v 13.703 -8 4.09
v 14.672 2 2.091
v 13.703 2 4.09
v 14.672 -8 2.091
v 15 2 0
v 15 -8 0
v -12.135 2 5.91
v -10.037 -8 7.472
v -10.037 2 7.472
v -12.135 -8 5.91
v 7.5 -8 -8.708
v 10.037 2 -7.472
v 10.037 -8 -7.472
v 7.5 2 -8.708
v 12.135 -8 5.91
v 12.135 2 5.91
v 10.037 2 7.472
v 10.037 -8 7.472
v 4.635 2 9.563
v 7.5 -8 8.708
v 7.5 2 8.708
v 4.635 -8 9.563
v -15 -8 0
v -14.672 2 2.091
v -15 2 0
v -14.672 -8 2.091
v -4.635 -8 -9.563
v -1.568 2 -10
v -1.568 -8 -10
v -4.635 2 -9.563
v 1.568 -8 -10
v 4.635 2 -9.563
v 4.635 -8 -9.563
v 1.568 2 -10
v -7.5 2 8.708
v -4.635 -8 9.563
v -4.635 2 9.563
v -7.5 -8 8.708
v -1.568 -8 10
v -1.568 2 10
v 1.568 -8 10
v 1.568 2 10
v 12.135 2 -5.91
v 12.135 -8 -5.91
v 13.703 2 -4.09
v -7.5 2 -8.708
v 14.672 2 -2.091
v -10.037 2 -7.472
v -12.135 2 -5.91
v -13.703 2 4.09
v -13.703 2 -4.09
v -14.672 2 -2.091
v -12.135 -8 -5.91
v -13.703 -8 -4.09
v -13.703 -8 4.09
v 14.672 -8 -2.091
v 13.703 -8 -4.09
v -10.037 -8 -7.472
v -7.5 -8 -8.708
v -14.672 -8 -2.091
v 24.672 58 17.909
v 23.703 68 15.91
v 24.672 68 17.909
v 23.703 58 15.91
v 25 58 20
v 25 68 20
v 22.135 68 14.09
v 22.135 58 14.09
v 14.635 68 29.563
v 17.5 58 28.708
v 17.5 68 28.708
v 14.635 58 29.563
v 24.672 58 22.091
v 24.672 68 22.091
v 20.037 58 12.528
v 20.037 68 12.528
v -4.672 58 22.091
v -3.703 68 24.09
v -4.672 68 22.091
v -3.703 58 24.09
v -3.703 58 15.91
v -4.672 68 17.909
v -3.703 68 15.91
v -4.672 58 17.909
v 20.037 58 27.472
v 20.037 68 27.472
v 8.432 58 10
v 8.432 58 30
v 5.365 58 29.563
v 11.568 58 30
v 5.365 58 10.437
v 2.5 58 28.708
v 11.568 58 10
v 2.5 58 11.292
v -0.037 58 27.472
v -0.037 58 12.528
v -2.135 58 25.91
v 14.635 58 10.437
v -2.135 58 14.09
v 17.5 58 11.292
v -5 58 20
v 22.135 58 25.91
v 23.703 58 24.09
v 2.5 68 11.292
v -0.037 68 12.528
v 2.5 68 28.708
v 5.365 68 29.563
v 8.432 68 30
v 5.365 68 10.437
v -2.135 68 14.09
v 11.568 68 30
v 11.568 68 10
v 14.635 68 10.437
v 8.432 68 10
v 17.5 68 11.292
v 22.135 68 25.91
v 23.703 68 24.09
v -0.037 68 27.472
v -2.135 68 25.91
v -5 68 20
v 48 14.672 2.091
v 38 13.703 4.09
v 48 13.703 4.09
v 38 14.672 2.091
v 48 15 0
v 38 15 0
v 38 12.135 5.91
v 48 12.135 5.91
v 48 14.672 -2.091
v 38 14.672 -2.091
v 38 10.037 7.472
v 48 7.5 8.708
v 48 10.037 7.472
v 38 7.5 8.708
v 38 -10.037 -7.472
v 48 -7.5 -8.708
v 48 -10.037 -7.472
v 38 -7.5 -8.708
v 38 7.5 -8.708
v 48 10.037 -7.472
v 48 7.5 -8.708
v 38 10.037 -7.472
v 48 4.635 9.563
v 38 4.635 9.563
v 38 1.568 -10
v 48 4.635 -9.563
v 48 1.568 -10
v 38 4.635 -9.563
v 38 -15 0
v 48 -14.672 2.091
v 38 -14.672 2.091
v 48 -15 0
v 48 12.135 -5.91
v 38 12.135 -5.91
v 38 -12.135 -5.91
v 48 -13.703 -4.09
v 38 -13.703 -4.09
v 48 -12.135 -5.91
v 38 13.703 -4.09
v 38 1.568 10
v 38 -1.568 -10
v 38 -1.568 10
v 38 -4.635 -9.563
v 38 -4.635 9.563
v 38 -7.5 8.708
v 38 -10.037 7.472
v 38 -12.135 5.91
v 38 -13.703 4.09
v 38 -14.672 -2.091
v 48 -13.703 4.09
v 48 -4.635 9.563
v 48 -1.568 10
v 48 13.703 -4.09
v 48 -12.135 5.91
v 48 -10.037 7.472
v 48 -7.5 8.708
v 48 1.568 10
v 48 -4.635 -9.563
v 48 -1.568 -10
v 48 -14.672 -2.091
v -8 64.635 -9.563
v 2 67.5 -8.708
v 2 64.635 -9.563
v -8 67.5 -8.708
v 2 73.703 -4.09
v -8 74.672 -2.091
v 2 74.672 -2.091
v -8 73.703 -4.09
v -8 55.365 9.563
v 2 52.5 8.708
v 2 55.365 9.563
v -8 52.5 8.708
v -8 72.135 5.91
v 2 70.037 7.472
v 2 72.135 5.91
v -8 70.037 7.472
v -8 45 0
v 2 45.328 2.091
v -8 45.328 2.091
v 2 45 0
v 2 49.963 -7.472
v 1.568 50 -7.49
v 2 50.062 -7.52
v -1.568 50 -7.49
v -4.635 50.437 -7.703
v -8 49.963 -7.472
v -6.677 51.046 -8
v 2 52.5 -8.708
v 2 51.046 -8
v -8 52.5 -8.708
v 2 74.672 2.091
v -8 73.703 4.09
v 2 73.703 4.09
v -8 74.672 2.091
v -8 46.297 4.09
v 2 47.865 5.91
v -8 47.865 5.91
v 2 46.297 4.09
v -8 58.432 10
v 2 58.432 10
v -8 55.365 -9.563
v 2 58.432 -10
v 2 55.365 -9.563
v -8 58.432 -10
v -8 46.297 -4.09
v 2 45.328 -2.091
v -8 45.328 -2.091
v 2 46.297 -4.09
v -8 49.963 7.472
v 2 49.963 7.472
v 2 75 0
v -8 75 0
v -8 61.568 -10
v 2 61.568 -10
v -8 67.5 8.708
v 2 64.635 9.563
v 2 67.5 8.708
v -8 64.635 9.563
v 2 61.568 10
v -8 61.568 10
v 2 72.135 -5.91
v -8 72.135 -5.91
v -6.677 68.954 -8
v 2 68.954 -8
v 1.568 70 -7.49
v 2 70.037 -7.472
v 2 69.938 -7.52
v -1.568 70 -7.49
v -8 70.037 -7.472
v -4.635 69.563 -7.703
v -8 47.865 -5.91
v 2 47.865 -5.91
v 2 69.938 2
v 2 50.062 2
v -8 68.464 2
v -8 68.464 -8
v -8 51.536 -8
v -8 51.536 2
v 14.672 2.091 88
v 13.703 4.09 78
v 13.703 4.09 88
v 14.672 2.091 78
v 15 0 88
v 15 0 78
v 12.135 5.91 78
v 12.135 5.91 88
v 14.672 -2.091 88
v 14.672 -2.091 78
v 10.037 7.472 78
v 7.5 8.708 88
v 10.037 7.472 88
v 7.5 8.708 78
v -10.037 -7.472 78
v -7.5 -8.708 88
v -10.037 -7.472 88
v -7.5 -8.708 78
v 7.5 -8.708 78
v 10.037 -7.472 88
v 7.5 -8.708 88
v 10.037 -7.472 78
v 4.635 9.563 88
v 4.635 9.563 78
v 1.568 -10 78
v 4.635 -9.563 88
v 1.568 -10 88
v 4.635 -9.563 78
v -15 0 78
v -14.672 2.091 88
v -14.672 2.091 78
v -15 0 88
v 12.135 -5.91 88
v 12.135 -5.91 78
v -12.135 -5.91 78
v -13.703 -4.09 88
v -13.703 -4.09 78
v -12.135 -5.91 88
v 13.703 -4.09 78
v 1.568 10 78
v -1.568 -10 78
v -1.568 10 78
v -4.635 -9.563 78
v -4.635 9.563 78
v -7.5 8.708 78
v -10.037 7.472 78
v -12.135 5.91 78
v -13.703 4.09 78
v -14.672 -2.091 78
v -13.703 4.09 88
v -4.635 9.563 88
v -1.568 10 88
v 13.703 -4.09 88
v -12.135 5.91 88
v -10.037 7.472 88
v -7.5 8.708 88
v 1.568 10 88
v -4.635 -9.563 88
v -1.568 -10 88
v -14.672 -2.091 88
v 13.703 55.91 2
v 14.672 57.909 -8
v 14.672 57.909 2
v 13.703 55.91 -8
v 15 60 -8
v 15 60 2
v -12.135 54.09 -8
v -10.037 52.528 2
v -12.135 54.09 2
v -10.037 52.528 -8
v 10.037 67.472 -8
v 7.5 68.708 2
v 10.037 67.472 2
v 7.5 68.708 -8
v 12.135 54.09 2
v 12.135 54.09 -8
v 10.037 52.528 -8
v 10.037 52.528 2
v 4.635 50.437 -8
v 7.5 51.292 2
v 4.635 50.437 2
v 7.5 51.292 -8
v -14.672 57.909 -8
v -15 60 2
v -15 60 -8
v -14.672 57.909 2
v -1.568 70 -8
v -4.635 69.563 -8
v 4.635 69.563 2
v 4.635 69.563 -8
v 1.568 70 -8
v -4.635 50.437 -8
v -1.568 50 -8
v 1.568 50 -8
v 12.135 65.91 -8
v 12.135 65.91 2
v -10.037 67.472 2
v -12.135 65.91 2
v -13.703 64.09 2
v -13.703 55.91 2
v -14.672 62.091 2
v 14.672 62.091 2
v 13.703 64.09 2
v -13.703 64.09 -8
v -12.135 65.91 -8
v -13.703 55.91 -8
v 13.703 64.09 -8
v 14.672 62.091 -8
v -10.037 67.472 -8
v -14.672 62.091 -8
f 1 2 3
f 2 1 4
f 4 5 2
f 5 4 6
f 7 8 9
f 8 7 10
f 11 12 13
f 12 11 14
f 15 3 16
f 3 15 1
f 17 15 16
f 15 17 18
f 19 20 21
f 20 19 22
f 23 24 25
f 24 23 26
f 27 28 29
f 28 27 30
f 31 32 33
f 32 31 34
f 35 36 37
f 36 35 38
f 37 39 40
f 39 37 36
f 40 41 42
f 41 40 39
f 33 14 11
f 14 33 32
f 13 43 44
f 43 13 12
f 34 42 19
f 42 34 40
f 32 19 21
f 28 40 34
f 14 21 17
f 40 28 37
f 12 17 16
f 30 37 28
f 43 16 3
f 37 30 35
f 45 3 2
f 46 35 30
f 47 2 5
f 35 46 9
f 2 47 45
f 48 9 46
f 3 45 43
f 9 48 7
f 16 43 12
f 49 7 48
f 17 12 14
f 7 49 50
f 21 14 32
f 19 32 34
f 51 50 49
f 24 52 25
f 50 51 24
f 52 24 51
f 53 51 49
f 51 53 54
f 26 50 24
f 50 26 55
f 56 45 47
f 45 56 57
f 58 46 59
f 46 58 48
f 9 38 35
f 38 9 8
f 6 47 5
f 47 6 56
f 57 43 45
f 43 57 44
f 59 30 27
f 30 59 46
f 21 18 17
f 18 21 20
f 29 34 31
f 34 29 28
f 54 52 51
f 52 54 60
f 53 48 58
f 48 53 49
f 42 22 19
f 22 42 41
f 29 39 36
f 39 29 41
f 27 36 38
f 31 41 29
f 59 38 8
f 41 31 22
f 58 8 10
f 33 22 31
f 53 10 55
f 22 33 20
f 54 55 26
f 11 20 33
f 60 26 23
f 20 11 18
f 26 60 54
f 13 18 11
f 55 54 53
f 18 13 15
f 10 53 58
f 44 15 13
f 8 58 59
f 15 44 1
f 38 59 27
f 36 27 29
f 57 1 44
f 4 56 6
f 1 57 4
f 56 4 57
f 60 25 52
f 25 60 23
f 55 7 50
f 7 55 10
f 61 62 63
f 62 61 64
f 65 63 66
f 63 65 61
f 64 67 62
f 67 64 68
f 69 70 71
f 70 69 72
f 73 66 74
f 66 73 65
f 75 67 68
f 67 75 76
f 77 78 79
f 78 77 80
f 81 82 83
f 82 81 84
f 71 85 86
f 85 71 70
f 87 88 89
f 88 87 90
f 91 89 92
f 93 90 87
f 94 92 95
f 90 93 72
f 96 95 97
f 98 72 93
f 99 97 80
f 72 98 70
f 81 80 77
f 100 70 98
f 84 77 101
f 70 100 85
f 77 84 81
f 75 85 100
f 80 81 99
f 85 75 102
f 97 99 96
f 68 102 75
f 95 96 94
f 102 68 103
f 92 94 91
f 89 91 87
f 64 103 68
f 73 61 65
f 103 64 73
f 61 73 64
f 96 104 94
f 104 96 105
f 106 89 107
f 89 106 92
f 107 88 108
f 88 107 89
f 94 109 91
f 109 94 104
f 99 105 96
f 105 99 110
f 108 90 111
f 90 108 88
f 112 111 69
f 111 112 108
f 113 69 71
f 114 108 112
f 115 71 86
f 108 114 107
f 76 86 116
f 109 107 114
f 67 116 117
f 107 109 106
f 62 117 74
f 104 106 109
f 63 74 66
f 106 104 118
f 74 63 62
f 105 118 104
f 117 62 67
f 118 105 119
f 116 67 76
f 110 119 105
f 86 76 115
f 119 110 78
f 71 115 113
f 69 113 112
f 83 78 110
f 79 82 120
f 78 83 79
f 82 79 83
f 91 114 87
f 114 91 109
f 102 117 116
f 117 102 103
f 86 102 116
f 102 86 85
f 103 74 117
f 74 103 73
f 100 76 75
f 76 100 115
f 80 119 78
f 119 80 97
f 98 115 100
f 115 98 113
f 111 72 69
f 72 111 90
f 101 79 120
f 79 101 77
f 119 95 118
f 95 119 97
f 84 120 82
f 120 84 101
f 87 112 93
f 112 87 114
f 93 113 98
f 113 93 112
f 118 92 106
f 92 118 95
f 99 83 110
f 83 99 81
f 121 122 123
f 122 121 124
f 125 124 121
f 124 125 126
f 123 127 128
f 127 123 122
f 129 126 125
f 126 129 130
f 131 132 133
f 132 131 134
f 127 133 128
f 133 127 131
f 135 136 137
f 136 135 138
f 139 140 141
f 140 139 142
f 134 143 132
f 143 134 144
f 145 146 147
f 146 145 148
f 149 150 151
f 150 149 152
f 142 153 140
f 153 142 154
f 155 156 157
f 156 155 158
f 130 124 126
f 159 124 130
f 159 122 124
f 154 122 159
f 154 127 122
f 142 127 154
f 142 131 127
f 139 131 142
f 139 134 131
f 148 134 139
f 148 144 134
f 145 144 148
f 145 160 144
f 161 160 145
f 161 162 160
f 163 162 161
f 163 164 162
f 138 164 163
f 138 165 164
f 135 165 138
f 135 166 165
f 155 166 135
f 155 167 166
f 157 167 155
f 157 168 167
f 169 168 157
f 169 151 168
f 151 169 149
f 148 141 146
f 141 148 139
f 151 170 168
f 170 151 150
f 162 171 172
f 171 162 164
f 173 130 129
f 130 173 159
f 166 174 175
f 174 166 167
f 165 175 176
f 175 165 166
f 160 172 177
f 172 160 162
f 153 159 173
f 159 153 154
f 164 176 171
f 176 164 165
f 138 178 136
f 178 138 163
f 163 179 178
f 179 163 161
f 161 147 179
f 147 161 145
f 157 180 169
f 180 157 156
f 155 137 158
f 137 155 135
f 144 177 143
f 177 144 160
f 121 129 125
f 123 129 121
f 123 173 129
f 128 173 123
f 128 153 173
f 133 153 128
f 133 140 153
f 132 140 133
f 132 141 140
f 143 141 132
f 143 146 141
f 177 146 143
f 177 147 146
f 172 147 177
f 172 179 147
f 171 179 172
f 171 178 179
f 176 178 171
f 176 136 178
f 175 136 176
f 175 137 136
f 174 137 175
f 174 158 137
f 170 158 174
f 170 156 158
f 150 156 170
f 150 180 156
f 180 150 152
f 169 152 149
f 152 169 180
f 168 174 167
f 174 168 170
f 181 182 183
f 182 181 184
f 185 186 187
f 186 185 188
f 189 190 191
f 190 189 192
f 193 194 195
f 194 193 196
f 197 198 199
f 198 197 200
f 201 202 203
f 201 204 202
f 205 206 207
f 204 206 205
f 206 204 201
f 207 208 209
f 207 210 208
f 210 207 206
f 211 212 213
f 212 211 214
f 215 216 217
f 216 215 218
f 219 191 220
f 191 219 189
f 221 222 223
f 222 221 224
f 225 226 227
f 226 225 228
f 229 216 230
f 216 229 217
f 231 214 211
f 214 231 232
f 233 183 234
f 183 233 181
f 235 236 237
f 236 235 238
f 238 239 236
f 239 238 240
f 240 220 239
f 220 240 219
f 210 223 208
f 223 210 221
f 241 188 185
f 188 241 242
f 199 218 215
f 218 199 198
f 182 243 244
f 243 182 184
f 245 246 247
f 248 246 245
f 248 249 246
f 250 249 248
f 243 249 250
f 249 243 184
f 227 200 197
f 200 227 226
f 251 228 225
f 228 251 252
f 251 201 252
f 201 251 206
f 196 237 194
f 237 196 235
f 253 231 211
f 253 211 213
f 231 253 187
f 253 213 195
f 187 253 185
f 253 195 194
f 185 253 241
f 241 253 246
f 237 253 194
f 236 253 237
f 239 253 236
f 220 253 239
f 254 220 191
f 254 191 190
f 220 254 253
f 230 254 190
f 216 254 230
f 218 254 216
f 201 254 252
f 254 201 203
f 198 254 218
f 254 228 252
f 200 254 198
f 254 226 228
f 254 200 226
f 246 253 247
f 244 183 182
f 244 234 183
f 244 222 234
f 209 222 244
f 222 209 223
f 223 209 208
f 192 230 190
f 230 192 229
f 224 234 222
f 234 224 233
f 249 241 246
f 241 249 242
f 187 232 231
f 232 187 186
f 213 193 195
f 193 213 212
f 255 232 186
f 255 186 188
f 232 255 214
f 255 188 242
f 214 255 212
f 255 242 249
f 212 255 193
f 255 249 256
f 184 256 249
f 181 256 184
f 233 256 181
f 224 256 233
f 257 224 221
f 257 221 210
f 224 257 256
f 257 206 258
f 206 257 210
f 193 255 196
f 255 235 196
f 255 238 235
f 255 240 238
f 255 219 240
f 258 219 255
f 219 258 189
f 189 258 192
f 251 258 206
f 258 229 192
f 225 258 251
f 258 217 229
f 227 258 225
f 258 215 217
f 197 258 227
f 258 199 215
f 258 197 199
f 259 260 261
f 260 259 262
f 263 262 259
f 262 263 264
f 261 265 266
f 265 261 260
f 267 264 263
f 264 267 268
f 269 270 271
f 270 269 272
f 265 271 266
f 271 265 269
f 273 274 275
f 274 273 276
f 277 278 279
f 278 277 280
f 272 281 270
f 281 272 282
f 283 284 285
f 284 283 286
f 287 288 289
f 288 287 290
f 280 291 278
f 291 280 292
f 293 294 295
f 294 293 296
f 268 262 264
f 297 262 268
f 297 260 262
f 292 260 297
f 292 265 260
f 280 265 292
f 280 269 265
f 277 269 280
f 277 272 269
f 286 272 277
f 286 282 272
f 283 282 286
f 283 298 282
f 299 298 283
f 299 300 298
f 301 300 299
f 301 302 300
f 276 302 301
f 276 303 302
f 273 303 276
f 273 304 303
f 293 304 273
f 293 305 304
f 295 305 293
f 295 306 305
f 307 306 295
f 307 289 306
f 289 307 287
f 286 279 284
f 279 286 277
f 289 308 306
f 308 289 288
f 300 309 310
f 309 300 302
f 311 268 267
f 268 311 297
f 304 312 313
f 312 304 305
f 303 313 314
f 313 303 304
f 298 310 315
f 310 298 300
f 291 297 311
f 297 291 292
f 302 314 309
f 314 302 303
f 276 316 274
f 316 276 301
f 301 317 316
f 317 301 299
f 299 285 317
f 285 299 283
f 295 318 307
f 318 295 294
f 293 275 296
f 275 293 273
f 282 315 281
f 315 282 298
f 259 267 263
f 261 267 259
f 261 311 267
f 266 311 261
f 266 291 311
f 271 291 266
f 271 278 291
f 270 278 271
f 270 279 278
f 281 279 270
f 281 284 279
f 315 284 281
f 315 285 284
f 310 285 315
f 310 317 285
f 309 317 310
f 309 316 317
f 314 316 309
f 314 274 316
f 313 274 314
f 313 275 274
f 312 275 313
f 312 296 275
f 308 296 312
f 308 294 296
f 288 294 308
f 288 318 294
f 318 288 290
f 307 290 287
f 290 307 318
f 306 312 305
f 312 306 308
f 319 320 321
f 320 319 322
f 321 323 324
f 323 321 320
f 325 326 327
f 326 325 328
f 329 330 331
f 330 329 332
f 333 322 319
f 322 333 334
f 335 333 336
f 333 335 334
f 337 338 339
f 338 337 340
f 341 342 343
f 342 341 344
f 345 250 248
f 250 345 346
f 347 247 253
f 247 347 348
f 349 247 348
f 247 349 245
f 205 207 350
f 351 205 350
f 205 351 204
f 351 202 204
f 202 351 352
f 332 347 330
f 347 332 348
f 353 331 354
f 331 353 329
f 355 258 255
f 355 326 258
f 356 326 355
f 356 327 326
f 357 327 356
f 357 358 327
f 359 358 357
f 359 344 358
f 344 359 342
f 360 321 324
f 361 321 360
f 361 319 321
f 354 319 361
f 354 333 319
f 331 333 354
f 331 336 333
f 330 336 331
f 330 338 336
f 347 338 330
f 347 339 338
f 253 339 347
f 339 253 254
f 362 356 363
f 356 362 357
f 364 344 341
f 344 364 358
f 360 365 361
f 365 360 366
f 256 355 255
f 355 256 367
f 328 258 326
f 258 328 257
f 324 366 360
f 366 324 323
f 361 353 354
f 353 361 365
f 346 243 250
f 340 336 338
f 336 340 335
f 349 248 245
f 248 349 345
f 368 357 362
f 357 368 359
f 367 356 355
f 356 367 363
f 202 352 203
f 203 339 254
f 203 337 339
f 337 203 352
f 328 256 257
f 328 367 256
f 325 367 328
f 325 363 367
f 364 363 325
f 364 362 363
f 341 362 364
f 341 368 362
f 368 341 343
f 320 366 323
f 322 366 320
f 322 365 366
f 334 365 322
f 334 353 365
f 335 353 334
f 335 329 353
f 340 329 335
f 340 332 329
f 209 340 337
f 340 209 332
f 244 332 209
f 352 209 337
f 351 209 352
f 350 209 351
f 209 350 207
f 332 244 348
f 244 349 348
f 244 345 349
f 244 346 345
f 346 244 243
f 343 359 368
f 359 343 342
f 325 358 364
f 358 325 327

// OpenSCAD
// file: ../generic_case/screw_holes.scad
// Module for creating screw holes based on an array of [x,y,z] locations



module screw_holes(loc,dia,h){
    for(l=loc){
        translate(l){
            cylinder(d=dia,h=h);
        }
    }
}

module corner_latches(dim_b,loc_s,dia_s,space_s,height_s){
    //calculate corner points
    loc_c   = [[[0,0],[loc_s[0][0],0],[loc_s[0][0],loc_s[0][1]],[0,loc_s[0][1]]],
               [[loc_s[1][0],0],[dim_b[0],0],[dim_b[0],loc_s[1][1]],[loc_s[1][0],loc_s[1][1]]],
               [[loc_s[2][0],loc_s[2][1]],[dim_b[0],loc_s[2][1]],[dim_b[0],dim_b[1]],[loc_s[2][0],dim_b[1]]],
               [[0,loc_s[3][1]],[loc_s[3][0],loc_s[3][1]],[loc_s[3][0],dim_b[1]],[0,dim_b[1]]]]; // corners
    
    difference(){
        for(i=[0 : len(loc_c)-1]){
            hull(){
                linear_extrude(height_s)
                    polygon(points=loc_c[i]);
                translate(loc_s[i]){
                    cylinder(d=dia_s+space_s,h=height_s);
                }
            }
        }
    }
}
    
// file: ../generic_case/cube_round_xy.scad
// Module for painting cube with rounded corners in xy directions

module cube_round_xy(dim,mki){
    if(mki<=0){
        cube(dim);
    }
    else {
        translate([mki/2,mki/2,0]){
            linear_extrude(dim[2]){
                minkowski(){
                    square([dim[0]-mki,dim[1]-mki]);
                    circle(d=mki);
                }
            }
        }
    }
}
// file: ../generic_case/make_cuts-v2.scad
dim=[40,60,80];
loc=[10,20];
w=2;
x=30;
y=20;
z=10;
shape="round";

%cube(dim);

translate([x/2,0,y/2]){ // move to zero
    //front
    rotate([90,0,0])
        translate([0,0,+z/2-w]) // move into wall
            mkshape(shape);

    //back
    translate([dim[0]-x,0,0])
    rotate([270,0,0])
        translate([0,0,+z/2-w+dim[1]])
            mkshape(shape);
}


translate([0,x/2,y/2]){            
    //right
    rotate([90,0,90])
        translate([0,0,+z/2-w+dim[0]])
            mkshape(shape);
    
    //left
    translate([0,dim[1]-x,0])
    rotate([90,0,270])
        translate([0,0,+z/2-w])
            mkshape(shape);
}

translate([x/2,y/2,0]){            
    //top
    rotate([0,0,0])
        translate([0,0,+z/2-w+dim[2]])
            mkshape(shape);
    
    //bottom
    translate([0,dim[1]-y,0])
    rotate([180,0,0])
        translate([0,0,+z/2-w])
            mkshape(shape);
}

module mkshape(shape){
    if(shape=="square"){
        cube([x,y,z],center=true);
    }
    if(shape=="round"){
        translate([-x/2,-y/2,0])
        resize([0,y,0])
            cylinder(d=x,h=z,center=true);
    }
}
// file: ../generic_case/basic_case-parameterized-v2.scad
include <make_cuts-v2.scad>
include <cube_round_xy.scad>
include <screw_holes.scad>

// Example values
// Render options
/*$fn              = 32;
case_part        = "body";
render_mode      = "normal";

// Case values
wall             = 3;
rim              = 1;
mki              = 2;

// Board values
dim_board        = [60,30,2];
cuts             = [[[0,-3],[5,3],wall+rim,"front","sqr"],       
                    [[0,0],[5,3],wall+rim,"back","sqr"],
                    [[0,0],[5,3],wall+rim,"left","sqr"],
                    [[0,0],[5,3],wall+rim,"right","sqr"]];
space_top        = 5;
space_bottom     = 5;
space_bscrew     = 1;

// Case Screw values
dia_cscrew       = 1.8;
dia_chead        = 4;
height_chead     = 3;
loc_cscrews      = [[-(dia_chead/2),-(dia_chead/2)],
                    [dim_board[0]+(dia_chead/2),-(dia_chead/2)],
                    [dim_board[0]+(dia_chead/2),dim_board[1]+(dia_chead/2)],
                    [-(dia_chead/2),dim_board[1]+(dia_chead/2)]];

// Board Screw values
dia_bscrew       = 3.2;
dia_bhead        = 5.2;
height_bhead     = 2.4;
loc_bscrews      = [[3.5,3.5],
                    [dim_board[0]-3.5,3.5],
                    [dim_board[0]-3.5,dim_board[1]-3.5],
                    [3.5,dim_board[1]-3.5]];                    

// case module
case(part=case_part,
     render_mode=render_mode,
     
     wall=wall,
     rim=rim,
     mki=mki,
          
     dim_b=dim_board,
     cuts=cuts,
     space_top=space_top,
     space_bottom=space_bottom,
     space_bscrew=space_bscrew,

     dia_cscrew=dia_cscrew,
     dia_chead=dia_chead,
     height_chead =height_chead,
     loc_cscrews=loc_cscrews,
     
     dia_bscrew=dia_bscrew,
     dia_bhead=dia_bhead,
     height_bhead=height_bhead,
     loc_bscrews=loc_bscrews);*/
     
     
     
     
// case module
module case(part="case", // which part to render
            render_mode="normal", // how to render
            
            wall=1.4,         // wall thickness
            rim=0.3,         // rim between board and wall thickness
            mki=2,       // corner rounding value (0=no rounding)
            
            dim_b,     // board dimension (without components)
            cuts,      // location of port openings ()
            space_top,        // height of components on top of board
            space_bottom,        // height of components below board
            space_bscrew=1,   // space around screw holes
            
            dia_cscrew = 3.3, // case screw values
            dia_chead = 5.5,
            height_chead = 3,
            loc_cscrews,
     
            dia_bscrew=3,     // screw diameter
            dia_bhead=5.2,
            height_bhead=2.4,
            loc_bscrews)     // screw locations (array of [x,y] pairs, starting left lower corner, counterclockwise)  
{
    // calculate values;
    height_case = space_top+space_bottom+dim_b[2]; // height of case without bottom/cover
    height_bottom = wall;
    dim_case    = dim_b+[2*(wall+rim),2*(wall+rim),space_top+space_bottom];
    height_bscrew = space_bottom-height_chead;
    //bottom();
    
    if(render_mode=="normal"){
        if(part=="body"){
            body();
        }
        
        if(part=="bottom"){
            bottom();
        }
        
        if(part=="cover"){
            cover();
        }
    }
    
    if(render_mode=="shape"){
        if(part=="body"){
            hull(){
                body();
            }
            hull(){
                cutout_ports();
            }
        }
        
        if(part=="bottom"){
            echo("shape/bottom is unsupported");
        }
        
        if(part=="cover"){
            echo("shape/cover is unsupported");
        }
    }


    // case
    module body(){
        difference(){
            union(){
                outer_frame();
                inner_frame();
            }
            cutout_ports();
            case_screws();
        }
    }
    
    // bottom
    module bottom(){
        translate([0,0,-wall]){
            difference(){
                cube_round_xy([dim_case[0],dim_case[1],height_bottom],mki);
                cutout_ports();
            }
        }
    }
    
    module outer_frame(){
        difference(){
            cube_round_xy(dim_case,mki);
            cutout_inside();
        }
    }
    
    module inner_frame(){
        rim();
        board_screws();
    }
    
    module rim(){
        translate([0,0,space_bottom-height_bscrew]){
            // rim
            difference(){
                    translate([wall,wall,0]){
                        cube([dim_b[0]+2*rim,dim_b[1]+2*rim,height_bscrew]);
                    }
                    translate([wall+rim,wall+rim,0]){
                       cube([dim_b[0],dim_b[1],height_bscrew]);
                }
            }
        }
    }
            
    module board_screws(){
        translate([0,0,space_bottom-height_bscrew]){
            translate([wall+rim,wall+rim,0]){
                difference(){
                    corner_latches(dim_b,loc_bscrews,dia_bscrew,space_bscrew,height_bscrew);
                    screw_holes(loc=loc_bscrews,dia=dia_bscrew,h=height_case);
                }
            }
        }
    }
    
    module case_screws(){
        translate([wall+rim,wall+rim,0]){
            screw_holes(loc=loc_cscrews,dia=dia_cscrew,h=height_case);
        }
    }
    
    module cutout_inside(){
        translate([wall,wall,0]){
            cube([dim_b[0]+2*rim,dim_b[1]+2*rim,height_case]);
        }
    }
    
    // cutout of port openings
    module cutout_ports(){
        translate([wall+rim,wall+rim,space_bottom]){
            make_cuts_v2(dim=dim_b,cuts=cuts);
        }
    }
}
// main file
include <../generic_case/basic_case-parameterized-v2.scad>

wall                = 1.6;
rim                 = 0.8;

// T3 LoRa frame values
dim_t3_board        = [65,27,1.25];
uppers_t3           = 5;
lowers_t3           = 12;
dia_t3_screws       = 2.1;
loc_t3_screws       = [[2.6,1.45],
                       [dim_t3_board[0]-2.6,3.2,0],
                       [dim_t3_board[0]-2.6,dim_t3_board[1]-1.45,0],
                       [2.6,dim_t3_board[1]-3.2,0]];
cuts_t3             = [[[14.8,-8],[7,7],wall+rim+1,"front","round"],  // antenna port
                       [[1.5,-1.75],[11,6],wall+rim+1,"left","square"], // usb port
                       [[13.4,0],[11.5,3],wall+rim+1,"left","square"],  // sdcard/usb port
                       [[40.8,-dim_t3_board[2]-2.1],[4.65,2.1],wall+rim+1,"back","square"],  // reset
                       [[49.5,-dim_t3_board[2]-4],[9.4,4],wall+rim+1,"back","square"]];// reset button
space_t3_screws        = 1;

case(dim_b=dim_t3_board,
     h1=uppers_t3,
     h2=lowers_t3,
     dia_s=dia_t3_screws,
     space_s=space_t3_screws,     
     loc_s=loc_t3_screws,
     cuts=cuts_t3,
     w=wall,
     r=rim);
